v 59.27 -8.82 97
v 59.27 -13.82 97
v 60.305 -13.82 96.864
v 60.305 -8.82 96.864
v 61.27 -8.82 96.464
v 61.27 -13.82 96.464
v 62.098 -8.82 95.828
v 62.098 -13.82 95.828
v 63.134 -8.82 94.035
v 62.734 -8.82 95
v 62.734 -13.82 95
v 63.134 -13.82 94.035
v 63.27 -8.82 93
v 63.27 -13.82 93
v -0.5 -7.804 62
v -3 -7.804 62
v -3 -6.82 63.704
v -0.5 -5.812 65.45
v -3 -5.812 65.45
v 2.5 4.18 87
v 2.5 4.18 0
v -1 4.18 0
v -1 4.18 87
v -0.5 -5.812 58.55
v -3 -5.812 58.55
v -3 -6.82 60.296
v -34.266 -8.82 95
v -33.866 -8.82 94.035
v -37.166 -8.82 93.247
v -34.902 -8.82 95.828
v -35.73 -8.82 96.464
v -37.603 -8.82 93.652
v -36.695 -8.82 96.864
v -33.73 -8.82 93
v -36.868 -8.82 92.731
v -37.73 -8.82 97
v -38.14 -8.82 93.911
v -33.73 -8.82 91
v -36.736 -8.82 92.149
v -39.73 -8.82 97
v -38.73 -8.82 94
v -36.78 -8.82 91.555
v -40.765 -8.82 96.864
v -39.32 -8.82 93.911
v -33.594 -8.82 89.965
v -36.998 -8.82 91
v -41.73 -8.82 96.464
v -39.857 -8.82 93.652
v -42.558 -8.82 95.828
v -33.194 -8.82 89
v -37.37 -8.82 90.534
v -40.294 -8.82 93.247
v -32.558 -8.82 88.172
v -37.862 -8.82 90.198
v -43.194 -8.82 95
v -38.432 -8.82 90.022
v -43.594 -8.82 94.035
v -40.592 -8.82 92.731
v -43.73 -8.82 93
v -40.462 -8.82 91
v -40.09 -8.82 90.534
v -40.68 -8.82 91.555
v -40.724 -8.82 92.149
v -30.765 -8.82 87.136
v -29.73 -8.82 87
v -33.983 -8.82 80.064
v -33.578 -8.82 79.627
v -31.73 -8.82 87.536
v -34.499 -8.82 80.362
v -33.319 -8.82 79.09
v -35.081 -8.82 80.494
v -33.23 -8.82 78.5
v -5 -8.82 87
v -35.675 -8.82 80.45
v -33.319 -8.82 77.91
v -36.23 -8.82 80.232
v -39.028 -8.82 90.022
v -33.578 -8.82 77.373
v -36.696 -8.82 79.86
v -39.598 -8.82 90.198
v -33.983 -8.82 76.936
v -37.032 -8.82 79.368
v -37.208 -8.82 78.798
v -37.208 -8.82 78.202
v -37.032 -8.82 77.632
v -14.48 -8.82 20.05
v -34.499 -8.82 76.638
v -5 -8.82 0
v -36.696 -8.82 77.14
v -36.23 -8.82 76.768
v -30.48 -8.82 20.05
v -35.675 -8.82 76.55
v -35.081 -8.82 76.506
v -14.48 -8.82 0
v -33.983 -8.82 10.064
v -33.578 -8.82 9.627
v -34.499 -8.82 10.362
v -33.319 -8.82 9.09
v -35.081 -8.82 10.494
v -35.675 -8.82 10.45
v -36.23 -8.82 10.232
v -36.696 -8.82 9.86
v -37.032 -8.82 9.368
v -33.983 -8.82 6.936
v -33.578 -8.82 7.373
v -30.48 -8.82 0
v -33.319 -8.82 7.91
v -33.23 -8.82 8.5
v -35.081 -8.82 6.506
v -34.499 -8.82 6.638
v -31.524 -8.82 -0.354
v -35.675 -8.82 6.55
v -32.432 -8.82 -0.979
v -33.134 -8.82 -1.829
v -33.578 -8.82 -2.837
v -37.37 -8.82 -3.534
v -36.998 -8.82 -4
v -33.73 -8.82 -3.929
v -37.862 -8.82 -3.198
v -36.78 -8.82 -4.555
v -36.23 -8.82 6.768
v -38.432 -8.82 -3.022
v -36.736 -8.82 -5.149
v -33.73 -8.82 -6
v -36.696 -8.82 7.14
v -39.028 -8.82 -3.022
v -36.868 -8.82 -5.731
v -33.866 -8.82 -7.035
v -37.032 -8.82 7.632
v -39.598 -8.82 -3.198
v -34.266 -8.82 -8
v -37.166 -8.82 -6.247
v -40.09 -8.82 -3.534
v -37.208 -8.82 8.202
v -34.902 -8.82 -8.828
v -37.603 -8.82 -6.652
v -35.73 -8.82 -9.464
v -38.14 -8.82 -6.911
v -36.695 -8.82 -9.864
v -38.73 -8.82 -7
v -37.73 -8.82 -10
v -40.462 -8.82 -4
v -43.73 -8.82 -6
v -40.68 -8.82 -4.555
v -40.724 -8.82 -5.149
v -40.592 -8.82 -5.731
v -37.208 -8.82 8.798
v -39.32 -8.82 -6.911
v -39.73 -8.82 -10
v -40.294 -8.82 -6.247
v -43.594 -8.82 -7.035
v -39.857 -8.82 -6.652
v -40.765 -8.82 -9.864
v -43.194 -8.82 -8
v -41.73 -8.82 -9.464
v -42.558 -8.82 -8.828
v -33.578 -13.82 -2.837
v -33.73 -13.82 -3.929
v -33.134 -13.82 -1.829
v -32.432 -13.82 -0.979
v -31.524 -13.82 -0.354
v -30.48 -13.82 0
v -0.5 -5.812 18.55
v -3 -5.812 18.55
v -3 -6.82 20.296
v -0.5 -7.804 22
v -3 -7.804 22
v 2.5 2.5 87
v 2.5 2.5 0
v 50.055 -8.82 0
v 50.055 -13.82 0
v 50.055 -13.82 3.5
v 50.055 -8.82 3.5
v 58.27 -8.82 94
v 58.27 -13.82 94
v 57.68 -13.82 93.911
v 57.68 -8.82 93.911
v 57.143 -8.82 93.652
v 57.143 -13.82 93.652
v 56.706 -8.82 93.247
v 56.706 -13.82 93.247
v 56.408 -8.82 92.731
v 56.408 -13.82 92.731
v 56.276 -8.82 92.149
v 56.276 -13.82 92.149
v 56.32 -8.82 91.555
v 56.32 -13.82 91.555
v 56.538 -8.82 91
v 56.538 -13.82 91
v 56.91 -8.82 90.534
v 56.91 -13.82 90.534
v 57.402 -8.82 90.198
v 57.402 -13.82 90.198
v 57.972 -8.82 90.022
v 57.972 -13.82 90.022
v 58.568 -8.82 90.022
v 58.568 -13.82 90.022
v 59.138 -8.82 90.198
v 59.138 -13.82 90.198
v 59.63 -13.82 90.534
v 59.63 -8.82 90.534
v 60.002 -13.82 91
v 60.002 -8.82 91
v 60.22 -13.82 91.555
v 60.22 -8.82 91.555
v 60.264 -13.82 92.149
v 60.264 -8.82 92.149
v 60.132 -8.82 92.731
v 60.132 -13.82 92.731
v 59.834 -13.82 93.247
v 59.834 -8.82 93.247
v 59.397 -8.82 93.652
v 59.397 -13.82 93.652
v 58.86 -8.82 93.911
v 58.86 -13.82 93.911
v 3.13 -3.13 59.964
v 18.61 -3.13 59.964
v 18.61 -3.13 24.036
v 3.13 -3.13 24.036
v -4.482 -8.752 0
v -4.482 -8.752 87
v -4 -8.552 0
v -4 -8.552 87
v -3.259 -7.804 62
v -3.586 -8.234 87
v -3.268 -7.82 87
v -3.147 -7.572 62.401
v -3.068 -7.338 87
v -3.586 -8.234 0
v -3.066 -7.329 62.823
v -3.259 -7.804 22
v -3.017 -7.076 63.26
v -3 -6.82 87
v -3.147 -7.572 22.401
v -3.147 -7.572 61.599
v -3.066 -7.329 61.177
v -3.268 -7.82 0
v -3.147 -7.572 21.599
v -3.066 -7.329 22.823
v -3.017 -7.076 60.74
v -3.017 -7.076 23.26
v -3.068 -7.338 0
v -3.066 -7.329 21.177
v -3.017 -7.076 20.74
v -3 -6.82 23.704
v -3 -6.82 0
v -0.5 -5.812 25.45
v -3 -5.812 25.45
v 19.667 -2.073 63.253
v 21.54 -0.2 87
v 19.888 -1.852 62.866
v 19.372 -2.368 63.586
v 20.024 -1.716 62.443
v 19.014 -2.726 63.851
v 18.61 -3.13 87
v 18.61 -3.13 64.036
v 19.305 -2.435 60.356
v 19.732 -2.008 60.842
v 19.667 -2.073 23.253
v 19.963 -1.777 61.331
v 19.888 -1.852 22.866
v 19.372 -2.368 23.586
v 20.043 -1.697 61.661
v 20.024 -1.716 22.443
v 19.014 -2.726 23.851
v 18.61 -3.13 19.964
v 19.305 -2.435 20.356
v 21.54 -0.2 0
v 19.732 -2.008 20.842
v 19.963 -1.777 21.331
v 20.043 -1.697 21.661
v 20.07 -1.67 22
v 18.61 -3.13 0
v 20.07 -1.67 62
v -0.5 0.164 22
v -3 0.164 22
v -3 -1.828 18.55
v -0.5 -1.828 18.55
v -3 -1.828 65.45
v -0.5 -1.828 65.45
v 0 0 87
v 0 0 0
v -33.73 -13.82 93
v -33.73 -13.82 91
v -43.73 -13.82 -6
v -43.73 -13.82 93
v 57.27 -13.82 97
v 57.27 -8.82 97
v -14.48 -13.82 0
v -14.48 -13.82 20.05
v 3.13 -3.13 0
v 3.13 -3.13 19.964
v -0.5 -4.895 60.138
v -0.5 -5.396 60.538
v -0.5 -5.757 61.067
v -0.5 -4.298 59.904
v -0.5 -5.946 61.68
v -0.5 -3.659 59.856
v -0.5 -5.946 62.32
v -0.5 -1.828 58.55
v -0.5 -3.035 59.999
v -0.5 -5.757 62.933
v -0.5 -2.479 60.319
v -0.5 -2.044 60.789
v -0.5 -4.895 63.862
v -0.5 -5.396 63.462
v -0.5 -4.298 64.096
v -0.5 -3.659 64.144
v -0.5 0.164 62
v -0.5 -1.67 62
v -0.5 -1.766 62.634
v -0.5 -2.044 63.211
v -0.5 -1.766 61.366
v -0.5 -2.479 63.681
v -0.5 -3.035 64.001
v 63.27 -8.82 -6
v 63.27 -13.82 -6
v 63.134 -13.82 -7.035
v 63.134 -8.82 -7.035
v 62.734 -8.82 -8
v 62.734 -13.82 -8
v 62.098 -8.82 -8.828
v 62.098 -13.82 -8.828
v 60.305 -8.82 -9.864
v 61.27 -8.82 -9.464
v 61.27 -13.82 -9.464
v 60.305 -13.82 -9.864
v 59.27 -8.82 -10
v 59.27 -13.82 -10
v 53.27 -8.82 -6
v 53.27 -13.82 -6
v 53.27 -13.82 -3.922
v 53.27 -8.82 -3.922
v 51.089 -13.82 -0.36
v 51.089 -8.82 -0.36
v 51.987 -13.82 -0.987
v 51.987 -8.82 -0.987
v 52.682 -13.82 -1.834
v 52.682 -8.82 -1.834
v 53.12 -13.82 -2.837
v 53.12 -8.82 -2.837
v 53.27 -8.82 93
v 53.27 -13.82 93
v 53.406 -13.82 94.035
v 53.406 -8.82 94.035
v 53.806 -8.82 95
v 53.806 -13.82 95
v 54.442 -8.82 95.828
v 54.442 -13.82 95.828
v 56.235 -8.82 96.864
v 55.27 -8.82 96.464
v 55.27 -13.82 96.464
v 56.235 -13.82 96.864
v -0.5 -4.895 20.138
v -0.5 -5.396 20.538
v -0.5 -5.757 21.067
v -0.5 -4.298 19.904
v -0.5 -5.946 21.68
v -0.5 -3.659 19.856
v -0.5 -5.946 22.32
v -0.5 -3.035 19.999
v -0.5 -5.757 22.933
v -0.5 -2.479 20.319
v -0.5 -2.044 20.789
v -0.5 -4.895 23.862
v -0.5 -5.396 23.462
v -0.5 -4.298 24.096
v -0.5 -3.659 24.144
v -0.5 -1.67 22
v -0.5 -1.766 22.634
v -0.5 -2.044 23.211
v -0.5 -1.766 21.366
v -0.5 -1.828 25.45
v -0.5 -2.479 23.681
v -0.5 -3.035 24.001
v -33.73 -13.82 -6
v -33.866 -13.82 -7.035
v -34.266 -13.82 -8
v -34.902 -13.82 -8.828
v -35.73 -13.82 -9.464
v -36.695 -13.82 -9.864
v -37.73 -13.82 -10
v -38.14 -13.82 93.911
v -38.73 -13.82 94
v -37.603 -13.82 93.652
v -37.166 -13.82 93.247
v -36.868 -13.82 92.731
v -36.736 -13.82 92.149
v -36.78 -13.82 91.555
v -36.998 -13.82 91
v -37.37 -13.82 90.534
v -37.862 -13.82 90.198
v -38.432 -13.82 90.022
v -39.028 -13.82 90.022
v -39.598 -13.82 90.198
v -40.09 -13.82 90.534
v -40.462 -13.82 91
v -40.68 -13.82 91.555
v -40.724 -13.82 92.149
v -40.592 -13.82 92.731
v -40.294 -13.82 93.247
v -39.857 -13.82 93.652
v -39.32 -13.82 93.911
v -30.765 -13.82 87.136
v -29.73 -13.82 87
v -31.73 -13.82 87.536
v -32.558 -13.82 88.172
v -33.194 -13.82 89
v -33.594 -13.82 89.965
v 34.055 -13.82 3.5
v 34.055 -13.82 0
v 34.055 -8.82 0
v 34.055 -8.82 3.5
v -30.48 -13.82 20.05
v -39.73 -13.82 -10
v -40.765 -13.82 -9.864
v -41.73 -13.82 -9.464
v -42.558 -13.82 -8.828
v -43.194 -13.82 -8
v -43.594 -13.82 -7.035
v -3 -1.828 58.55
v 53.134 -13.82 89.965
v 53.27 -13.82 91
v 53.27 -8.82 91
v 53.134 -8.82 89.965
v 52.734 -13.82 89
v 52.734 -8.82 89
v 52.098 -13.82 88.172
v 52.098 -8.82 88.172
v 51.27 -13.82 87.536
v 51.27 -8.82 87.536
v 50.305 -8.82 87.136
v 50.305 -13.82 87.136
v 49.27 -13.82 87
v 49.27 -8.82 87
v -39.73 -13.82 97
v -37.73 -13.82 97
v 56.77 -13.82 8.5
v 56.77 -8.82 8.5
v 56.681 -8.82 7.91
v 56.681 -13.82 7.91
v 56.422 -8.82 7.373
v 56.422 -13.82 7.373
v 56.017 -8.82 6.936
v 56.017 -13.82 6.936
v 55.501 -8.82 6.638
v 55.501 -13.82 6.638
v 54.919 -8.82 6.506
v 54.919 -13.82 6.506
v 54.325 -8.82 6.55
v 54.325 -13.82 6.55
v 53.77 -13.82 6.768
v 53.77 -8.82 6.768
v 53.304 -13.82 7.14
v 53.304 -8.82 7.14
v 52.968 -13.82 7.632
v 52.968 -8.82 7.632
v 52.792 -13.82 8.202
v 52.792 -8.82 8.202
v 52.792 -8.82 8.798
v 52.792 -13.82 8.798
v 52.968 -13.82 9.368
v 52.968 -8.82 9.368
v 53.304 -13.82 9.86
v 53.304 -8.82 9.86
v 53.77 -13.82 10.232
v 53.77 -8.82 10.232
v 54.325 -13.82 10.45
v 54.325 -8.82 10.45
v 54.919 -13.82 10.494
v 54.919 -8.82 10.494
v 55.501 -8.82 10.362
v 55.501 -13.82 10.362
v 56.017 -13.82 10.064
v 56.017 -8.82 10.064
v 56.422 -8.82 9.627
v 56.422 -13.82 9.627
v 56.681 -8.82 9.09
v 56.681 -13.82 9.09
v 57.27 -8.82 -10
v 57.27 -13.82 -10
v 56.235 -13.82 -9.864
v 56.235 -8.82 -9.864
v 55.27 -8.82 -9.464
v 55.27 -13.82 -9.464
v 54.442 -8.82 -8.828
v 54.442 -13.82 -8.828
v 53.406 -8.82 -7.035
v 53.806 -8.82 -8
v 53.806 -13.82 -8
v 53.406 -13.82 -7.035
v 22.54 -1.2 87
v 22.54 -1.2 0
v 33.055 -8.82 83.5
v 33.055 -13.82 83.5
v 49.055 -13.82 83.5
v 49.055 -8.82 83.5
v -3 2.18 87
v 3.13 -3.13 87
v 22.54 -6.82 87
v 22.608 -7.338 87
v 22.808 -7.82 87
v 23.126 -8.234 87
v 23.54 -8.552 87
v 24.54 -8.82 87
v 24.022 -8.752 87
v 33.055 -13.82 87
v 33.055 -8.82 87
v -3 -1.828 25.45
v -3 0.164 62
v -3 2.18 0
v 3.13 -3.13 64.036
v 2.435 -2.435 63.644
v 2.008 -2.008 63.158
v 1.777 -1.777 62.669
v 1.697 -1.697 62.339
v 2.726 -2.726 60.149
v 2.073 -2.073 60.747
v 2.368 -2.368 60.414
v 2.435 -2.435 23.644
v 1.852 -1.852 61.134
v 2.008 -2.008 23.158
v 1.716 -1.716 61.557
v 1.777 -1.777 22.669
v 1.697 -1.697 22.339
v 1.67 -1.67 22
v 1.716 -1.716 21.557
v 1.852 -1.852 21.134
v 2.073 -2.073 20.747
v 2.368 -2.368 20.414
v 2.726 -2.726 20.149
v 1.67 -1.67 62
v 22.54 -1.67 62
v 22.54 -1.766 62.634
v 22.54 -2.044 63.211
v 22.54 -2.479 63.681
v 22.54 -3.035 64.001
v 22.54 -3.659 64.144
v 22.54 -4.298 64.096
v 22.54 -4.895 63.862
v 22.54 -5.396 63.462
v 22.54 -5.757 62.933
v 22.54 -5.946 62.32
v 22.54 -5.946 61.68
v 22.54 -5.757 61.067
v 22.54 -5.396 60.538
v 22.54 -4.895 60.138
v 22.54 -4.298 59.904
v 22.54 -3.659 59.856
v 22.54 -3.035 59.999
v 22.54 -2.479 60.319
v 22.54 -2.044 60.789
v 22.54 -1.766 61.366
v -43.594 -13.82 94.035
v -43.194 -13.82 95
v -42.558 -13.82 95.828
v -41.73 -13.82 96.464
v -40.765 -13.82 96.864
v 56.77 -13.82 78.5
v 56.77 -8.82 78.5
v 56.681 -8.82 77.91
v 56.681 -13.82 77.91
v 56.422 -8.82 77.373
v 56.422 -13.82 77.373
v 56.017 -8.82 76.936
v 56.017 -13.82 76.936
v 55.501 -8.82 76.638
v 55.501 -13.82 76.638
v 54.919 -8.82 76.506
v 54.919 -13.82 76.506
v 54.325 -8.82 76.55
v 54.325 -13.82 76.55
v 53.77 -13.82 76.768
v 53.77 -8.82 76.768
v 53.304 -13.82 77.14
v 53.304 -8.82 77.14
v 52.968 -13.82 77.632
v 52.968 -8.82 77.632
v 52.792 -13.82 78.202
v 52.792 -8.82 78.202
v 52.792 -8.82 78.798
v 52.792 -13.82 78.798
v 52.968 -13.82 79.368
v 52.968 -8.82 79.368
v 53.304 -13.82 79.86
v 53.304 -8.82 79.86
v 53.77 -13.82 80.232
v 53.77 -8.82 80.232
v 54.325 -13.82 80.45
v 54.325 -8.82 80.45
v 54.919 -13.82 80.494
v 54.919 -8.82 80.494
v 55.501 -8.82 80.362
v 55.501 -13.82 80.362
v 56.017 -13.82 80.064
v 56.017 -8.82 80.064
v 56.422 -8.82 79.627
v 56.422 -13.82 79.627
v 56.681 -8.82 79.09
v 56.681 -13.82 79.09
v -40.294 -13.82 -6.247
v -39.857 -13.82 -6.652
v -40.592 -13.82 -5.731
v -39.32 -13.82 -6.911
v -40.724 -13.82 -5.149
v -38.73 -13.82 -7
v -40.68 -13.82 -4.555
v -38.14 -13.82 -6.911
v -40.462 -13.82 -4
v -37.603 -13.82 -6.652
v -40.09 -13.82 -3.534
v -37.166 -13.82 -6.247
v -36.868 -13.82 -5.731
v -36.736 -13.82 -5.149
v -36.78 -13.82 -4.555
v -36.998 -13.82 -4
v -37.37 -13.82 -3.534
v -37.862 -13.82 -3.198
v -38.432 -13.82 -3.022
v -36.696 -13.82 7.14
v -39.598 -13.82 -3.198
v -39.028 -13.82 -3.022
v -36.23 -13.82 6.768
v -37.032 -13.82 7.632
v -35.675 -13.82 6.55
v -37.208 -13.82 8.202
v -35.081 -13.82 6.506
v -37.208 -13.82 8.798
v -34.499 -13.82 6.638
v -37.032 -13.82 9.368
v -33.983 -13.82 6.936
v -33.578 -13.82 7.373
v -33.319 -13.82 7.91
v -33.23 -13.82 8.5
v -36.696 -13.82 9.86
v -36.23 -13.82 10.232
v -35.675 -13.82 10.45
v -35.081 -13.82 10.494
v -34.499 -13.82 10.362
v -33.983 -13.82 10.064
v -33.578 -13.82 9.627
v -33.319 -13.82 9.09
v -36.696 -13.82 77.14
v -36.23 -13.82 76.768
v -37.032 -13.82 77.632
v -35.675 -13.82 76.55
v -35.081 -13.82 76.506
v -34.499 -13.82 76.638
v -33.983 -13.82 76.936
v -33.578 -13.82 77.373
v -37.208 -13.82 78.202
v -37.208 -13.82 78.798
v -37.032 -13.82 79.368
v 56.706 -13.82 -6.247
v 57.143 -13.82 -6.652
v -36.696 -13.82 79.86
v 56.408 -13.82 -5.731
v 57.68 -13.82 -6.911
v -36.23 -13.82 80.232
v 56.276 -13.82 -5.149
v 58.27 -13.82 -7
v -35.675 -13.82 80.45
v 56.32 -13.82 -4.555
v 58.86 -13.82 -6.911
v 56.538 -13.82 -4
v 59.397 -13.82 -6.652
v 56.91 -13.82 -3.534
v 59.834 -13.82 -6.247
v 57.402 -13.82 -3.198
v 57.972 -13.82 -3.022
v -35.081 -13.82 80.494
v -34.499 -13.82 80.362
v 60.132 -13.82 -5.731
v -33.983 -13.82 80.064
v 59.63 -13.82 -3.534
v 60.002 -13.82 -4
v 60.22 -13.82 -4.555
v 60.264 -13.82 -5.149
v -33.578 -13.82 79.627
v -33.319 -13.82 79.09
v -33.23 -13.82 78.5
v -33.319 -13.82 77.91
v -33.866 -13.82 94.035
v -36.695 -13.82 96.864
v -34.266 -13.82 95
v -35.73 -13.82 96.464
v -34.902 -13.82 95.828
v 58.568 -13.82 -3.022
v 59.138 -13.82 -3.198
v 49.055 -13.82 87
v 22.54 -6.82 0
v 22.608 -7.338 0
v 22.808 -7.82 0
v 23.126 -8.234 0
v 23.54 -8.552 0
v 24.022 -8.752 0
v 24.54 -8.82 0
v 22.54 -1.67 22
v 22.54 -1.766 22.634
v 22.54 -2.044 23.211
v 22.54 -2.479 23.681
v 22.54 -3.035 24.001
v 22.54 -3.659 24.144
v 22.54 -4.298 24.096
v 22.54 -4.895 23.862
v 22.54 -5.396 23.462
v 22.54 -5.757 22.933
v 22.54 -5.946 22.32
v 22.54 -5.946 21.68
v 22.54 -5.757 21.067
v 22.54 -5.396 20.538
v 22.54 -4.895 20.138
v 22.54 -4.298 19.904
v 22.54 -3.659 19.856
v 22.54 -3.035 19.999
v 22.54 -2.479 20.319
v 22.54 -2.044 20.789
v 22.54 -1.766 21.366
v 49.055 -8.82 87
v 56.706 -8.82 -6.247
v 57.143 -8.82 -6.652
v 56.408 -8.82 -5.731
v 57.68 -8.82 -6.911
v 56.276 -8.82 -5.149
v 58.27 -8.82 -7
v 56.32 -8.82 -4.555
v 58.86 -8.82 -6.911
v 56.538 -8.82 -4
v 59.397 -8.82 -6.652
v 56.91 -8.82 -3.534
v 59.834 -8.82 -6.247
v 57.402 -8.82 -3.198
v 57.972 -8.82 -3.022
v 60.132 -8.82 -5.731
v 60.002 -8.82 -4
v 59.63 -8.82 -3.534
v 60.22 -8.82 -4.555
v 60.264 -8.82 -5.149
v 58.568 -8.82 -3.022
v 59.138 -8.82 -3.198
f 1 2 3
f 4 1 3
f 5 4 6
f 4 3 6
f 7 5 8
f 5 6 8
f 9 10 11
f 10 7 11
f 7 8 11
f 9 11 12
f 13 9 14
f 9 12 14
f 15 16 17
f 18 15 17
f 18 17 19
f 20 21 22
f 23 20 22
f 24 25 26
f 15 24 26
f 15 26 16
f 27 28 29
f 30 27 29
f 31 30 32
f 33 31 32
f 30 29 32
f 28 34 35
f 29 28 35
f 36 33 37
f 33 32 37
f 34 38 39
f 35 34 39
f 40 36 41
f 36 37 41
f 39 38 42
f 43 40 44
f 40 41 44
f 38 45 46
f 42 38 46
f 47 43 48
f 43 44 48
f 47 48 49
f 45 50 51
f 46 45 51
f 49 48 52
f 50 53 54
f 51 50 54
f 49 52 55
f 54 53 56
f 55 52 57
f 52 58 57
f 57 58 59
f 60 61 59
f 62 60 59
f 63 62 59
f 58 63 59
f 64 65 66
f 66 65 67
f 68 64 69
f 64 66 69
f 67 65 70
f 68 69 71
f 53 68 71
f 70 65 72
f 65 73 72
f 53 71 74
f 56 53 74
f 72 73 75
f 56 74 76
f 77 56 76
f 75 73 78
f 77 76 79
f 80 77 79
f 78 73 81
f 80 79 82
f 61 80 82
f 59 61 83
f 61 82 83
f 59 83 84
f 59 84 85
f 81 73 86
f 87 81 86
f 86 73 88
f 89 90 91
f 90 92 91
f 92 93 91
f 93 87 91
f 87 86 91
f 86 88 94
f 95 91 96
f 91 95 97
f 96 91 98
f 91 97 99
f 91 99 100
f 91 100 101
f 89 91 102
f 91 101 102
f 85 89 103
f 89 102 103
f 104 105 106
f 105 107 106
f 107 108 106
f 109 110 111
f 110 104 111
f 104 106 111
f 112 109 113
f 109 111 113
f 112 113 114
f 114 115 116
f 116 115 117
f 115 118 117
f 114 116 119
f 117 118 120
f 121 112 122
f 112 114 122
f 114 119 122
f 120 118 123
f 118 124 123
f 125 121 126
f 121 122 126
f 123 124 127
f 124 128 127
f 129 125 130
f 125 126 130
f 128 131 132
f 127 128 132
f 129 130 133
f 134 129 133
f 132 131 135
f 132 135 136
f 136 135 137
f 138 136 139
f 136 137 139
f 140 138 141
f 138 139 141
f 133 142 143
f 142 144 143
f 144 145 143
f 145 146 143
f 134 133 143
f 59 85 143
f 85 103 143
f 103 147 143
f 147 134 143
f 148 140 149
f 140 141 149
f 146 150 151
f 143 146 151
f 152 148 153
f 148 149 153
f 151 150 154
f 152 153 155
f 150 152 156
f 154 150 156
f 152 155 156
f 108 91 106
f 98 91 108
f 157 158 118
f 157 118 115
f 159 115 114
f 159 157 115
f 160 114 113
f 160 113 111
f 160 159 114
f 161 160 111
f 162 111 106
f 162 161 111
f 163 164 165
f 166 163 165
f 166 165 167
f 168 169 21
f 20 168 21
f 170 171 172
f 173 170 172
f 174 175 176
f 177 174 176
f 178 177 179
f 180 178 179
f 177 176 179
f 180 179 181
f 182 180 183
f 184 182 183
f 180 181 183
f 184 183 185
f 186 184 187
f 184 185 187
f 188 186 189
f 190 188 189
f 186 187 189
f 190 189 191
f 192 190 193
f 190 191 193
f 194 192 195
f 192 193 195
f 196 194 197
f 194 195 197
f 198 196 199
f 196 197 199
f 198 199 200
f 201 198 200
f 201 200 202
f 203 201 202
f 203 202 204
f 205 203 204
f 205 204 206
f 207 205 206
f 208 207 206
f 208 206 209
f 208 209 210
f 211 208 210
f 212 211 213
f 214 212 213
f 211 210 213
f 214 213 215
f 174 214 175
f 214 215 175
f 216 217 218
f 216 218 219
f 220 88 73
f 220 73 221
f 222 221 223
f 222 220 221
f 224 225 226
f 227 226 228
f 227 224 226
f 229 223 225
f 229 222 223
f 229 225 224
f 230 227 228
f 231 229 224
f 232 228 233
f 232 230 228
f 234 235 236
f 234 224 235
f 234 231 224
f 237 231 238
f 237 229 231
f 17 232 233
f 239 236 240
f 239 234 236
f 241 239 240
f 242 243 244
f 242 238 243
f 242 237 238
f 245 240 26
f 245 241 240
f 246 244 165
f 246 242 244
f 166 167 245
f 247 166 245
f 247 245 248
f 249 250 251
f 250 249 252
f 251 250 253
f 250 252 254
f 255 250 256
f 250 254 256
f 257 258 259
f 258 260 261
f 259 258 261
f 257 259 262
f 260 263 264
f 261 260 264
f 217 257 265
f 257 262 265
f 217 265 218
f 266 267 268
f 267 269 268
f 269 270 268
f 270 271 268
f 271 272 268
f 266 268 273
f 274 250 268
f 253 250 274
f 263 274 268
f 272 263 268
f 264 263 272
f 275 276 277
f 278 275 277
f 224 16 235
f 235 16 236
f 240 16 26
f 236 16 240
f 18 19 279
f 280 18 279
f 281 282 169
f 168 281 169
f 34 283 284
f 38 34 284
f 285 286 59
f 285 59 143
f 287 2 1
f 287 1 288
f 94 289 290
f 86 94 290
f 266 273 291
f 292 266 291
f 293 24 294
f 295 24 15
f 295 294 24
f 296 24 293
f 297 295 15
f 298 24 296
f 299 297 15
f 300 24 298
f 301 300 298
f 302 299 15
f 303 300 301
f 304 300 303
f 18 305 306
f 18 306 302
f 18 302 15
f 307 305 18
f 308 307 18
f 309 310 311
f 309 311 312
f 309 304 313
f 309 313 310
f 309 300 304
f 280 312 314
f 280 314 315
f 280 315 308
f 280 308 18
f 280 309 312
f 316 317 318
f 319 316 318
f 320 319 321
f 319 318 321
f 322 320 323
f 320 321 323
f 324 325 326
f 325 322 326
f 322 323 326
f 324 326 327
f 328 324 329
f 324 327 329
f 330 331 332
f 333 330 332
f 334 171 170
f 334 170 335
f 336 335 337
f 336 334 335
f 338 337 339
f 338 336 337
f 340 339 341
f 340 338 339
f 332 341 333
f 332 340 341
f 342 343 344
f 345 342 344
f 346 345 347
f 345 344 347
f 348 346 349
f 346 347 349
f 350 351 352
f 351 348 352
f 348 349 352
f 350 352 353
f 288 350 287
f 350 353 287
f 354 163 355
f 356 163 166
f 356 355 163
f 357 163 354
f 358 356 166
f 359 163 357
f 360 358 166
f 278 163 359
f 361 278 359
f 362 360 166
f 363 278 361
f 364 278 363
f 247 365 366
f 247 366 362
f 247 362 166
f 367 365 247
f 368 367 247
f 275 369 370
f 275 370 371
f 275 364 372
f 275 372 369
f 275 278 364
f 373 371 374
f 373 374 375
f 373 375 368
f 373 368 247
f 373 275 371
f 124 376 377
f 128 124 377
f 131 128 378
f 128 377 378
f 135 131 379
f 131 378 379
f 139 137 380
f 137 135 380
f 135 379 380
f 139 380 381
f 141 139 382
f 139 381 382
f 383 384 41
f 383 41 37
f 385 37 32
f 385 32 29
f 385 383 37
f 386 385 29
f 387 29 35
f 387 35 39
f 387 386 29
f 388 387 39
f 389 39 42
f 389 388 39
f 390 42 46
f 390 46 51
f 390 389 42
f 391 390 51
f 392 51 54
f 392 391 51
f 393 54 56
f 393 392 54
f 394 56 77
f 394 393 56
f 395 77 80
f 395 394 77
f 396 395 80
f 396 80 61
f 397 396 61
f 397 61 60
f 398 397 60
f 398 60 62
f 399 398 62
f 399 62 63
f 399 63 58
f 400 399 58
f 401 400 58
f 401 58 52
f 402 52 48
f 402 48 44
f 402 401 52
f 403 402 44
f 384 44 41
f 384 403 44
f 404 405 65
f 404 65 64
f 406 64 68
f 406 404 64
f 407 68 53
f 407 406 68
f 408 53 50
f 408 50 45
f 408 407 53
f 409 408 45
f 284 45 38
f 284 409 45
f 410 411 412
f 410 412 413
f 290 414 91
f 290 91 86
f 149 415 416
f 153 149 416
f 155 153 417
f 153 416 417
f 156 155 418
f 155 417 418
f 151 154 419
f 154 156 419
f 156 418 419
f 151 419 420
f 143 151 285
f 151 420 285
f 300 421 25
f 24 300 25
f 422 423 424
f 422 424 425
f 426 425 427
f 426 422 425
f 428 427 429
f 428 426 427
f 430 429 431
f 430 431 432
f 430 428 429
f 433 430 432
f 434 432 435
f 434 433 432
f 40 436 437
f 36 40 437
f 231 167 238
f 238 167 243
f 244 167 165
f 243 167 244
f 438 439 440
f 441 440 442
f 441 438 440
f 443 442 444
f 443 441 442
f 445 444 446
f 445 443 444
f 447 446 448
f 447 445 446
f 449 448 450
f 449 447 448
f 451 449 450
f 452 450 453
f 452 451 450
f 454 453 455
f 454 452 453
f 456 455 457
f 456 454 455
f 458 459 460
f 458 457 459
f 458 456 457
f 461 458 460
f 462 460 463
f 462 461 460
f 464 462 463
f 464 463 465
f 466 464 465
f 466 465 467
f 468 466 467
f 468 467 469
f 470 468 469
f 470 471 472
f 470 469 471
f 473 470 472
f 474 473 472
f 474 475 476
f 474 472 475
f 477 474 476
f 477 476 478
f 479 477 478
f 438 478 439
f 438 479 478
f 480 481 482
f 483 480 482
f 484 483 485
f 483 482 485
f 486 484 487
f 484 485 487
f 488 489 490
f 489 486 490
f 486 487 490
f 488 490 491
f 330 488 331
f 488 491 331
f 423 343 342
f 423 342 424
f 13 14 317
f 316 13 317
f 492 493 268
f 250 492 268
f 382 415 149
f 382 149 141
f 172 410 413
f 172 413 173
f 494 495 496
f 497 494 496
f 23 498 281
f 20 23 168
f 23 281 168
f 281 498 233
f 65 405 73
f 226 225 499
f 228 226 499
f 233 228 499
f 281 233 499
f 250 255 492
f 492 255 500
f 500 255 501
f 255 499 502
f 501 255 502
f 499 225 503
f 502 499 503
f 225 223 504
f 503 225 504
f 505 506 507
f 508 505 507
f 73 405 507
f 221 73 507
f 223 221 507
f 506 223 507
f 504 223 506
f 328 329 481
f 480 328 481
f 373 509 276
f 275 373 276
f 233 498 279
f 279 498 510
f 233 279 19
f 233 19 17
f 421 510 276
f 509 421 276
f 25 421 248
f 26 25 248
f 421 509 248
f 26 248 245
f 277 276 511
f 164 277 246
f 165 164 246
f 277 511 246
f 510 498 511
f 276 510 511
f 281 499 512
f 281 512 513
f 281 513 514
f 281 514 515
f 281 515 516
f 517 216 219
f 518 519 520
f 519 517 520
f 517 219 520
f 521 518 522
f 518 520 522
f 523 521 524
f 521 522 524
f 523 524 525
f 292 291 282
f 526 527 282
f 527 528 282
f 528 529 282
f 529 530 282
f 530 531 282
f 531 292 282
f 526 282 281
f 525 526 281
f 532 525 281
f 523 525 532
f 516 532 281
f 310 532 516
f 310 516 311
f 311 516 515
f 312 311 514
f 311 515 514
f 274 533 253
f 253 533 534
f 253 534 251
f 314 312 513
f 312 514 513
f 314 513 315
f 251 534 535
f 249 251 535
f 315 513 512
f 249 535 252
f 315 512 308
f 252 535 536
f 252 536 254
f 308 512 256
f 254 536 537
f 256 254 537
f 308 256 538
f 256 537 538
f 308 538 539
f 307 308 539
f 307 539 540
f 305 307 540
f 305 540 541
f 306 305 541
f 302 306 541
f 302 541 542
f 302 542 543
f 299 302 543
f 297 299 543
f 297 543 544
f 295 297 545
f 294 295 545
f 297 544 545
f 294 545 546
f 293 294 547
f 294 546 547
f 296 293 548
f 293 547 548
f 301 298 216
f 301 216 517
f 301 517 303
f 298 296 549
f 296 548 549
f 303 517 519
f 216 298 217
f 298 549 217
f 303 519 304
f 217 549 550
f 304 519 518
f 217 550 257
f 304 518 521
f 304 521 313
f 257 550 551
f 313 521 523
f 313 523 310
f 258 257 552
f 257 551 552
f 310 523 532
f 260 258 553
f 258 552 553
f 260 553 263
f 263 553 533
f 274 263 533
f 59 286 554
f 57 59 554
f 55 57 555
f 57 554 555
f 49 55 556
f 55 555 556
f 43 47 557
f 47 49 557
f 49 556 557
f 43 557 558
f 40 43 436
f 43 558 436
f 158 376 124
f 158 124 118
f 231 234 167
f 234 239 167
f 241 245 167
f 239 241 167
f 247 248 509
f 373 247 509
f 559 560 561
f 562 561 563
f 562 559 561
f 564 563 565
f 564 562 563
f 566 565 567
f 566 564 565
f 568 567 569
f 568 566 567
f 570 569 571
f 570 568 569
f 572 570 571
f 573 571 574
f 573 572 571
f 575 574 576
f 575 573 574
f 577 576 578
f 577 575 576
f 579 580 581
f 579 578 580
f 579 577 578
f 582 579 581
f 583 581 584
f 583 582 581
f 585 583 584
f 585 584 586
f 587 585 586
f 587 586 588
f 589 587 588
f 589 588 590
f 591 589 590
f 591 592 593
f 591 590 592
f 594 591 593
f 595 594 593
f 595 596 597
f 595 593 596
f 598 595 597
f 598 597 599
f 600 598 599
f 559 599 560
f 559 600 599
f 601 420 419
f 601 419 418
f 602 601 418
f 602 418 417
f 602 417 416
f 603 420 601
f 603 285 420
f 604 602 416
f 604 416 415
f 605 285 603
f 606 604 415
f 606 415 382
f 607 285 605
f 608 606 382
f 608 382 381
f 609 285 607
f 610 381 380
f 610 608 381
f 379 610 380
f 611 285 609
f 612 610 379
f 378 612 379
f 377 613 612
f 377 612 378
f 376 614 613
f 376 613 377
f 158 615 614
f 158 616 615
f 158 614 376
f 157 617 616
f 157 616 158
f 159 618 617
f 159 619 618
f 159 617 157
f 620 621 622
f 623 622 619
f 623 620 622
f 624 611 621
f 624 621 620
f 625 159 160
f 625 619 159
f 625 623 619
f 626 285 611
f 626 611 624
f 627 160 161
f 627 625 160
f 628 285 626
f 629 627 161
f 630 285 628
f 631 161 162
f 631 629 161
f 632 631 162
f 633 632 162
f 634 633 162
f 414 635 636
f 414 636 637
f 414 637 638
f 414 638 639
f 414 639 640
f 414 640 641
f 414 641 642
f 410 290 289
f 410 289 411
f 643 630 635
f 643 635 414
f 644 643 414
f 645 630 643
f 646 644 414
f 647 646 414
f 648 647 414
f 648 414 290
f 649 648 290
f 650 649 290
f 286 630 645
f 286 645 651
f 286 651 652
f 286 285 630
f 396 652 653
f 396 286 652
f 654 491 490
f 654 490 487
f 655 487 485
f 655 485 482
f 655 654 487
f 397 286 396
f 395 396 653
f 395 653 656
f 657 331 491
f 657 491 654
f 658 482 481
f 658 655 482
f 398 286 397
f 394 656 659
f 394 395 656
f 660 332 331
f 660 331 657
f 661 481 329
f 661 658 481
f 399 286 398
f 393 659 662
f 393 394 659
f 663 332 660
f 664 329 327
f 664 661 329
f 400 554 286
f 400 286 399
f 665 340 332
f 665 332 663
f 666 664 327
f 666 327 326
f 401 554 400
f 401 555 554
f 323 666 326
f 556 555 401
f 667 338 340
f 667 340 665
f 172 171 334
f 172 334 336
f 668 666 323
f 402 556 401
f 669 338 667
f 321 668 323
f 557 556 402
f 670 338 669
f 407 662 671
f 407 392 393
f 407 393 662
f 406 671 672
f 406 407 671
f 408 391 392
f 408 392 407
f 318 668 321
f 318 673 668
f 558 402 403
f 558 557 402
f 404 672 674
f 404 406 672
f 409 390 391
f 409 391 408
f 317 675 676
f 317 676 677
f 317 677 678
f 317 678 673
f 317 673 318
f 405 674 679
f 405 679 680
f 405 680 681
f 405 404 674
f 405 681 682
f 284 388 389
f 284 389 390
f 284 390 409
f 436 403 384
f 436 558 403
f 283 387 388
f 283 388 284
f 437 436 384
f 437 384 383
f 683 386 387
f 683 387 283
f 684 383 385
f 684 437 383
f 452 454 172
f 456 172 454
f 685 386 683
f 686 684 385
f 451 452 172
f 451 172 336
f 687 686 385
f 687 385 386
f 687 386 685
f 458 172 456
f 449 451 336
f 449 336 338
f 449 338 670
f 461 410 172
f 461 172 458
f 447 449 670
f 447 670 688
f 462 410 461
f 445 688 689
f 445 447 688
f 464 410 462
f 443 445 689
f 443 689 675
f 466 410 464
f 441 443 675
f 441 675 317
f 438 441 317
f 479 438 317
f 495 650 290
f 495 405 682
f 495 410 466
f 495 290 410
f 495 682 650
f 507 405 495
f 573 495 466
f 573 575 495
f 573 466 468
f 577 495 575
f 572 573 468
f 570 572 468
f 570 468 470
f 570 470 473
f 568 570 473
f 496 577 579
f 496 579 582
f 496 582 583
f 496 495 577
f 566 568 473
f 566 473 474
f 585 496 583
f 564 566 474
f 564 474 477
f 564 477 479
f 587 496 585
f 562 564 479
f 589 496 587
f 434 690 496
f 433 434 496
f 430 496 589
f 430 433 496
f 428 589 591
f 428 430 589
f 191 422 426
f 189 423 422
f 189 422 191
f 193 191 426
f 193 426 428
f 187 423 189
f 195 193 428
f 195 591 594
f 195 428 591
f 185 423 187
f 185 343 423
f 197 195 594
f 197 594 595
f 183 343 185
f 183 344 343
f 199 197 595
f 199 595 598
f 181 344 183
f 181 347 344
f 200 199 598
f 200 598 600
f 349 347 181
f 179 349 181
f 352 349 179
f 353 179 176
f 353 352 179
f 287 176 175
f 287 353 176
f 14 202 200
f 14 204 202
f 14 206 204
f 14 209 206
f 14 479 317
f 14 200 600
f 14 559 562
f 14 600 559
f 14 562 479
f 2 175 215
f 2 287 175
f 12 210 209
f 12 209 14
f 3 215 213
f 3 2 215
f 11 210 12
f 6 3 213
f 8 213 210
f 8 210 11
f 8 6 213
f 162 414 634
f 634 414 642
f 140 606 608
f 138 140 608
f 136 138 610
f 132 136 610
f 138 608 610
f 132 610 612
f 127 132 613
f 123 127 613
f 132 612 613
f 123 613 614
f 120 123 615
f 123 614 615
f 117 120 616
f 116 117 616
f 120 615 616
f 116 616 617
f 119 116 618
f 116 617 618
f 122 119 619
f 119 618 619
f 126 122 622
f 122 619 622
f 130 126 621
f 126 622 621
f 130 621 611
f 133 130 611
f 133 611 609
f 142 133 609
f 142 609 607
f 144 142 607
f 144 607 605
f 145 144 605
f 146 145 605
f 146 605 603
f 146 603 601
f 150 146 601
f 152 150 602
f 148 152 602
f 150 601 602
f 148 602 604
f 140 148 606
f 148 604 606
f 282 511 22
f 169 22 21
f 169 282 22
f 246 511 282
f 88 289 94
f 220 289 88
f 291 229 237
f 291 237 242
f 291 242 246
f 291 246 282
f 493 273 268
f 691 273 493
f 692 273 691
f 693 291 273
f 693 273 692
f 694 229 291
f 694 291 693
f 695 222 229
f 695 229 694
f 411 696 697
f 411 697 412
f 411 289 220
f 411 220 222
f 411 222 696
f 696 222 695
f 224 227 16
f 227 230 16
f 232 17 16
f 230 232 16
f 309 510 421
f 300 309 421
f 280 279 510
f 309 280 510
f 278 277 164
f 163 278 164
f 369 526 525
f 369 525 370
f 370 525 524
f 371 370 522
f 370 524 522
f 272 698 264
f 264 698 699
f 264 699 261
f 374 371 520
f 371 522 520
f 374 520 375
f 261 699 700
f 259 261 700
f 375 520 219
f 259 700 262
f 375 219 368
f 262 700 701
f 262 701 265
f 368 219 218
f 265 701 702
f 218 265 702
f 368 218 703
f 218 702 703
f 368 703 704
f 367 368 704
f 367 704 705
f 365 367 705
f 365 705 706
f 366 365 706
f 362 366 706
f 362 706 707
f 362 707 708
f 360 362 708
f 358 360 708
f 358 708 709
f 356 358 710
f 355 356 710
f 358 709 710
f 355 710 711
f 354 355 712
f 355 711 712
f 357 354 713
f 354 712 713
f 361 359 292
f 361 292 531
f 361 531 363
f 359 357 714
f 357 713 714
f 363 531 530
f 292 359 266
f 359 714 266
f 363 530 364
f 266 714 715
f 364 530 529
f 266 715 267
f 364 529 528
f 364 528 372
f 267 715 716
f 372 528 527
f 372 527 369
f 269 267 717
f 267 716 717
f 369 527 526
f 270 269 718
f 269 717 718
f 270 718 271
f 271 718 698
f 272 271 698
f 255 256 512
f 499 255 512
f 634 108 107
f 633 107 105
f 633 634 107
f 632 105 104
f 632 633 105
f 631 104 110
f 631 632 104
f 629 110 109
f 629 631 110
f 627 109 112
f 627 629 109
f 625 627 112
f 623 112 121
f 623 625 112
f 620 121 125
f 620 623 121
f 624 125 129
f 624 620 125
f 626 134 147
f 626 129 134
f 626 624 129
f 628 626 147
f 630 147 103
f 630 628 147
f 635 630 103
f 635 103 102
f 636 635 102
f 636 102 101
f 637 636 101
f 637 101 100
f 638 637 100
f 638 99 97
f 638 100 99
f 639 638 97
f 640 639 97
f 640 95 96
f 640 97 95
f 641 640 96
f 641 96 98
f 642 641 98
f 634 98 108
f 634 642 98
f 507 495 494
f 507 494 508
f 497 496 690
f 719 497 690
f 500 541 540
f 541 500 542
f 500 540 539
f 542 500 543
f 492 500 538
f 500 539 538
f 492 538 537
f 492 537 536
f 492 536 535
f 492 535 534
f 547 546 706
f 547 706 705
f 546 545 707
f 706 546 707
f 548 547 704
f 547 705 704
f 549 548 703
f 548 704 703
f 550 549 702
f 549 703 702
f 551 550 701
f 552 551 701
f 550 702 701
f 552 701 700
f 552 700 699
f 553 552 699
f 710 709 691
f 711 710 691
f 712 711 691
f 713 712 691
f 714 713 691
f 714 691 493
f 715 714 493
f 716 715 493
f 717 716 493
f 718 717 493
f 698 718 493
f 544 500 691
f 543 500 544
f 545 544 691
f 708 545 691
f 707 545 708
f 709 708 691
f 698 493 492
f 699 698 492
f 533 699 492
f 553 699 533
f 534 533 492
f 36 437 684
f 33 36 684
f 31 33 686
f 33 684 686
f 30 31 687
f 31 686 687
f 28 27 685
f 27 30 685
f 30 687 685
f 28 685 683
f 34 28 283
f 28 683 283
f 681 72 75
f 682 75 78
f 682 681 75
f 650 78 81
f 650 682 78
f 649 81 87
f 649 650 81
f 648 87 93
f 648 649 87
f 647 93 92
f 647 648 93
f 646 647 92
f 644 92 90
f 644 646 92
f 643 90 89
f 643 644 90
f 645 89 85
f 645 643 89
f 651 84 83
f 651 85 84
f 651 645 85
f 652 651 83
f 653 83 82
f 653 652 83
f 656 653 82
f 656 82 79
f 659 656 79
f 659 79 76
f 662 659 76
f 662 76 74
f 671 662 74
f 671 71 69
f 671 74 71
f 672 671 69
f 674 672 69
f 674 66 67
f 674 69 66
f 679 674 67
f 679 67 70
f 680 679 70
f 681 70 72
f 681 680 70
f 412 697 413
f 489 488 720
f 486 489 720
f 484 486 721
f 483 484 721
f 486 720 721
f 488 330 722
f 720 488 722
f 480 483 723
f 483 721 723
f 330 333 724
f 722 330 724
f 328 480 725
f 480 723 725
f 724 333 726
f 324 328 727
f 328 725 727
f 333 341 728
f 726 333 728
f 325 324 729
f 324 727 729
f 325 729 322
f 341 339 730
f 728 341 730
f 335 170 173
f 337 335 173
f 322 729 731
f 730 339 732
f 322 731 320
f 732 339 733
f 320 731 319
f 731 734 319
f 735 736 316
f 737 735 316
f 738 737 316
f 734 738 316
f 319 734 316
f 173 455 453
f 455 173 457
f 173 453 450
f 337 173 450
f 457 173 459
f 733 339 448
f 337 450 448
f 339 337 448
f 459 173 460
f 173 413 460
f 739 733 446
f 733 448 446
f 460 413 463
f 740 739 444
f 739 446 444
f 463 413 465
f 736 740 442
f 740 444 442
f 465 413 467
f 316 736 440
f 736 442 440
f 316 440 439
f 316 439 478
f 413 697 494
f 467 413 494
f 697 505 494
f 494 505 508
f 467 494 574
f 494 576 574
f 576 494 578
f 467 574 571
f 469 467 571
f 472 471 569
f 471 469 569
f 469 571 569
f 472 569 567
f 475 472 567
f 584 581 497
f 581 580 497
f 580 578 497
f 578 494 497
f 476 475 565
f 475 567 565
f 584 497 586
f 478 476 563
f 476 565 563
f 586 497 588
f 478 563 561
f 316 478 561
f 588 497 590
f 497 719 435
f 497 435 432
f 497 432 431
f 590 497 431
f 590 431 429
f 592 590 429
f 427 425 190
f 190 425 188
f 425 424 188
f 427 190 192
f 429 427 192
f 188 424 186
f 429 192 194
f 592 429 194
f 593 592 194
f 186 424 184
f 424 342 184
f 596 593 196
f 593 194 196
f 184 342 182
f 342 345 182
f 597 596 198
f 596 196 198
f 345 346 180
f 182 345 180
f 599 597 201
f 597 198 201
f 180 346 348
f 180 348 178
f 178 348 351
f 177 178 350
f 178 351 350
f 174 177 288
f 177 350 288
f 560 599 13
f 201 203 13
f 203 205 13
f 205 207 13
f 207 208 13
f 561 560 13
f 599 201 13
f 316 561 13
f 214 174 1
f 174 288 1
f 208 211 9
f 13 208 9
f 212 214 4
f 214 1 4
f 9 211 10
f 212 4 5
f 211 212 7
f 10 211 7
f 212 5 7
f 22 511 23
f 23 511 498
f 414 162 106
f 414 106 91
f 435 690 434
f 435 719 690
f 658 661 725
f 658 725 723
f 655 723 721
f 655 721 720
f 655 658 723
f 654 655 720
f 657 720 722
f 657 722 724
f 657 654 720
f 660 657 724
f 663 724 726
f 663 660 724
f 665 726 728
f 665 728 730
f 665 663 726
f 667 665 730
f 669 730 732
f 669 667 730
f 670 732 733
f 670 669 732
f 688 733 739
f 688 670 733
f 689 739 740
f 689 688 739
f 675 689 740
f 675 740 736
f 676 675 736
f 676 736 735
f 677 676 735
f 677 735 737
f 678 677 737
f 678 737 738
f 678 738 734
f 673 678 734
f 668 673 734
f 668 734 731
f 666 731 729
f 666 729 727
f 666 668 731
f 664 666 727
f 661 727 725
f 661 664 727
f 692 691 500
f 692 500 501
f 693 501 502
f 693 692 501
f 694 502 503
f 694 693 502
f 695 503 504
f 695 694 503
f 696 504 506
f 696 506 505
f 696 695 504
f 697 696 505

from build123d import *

# Parameters (mm, degrees)
BOSS_EXTRUDE1_DEPTH             = 87
CUT_EXTRUDE2_REACH              = 112.235
SKETCH7_R                       = 2.15
CUT_EXTRUDE3_DEPTH              = 2.5
F_4_0_START                     = -13.82
F_4_0_MM_DOWEL_HOLES1_OUTLINE_R = 2
F_4_0_MM_DOWEL_HOLES1_DEPTH     = 5.82
SKETCH11_W                      = 16
SKETCH11_H                      = 20.05000263
SKETCH11_H_2                    = 3.5
CUT_EXTRUDE4_DEPTH              = 10
SKETCH12_W                      = 10
SKETCH12_H                      = 10
SKETCH12_R                      = 2
BOSS_EXTRUDE2_DEPTH             = 5
MIRROR2_COPY_1_SKETCH_W         = 10
MIRROR2_COPY_1_SKETCH_H         = 10
MIRROR2_COPY_1_SKETCH_R         = 2
MIRROR2_COPY_1_DEPTH            = 5
FILLET1_R                       = 4
FILLET2_R                       = 2
CHAMFER1_SIZE                   = 2


with BuildPart() as part:
    # Sketch1 → Boss-Extrude1 (new body)
    with BuildSketch(Plane.XY):
        Polygon((0, 0), (2.5, 2.5), (2.5, 4.18), (-3, 4.18), (-3, -8.82), (-43.73, -8.82), (-43.73, -13.82), (63.27, -13.82), (63.27, -8.82), (22.54, -8.82), (22.54, -1.2), (21.54, -0.2), (18.61, -3.13), (3.13, -3.13), align=None)
    extrude(amount=BOSS_EXTRUDE1_DEPTH)

    # Sketch7 → Cut-Extrude2 (cut, up to next)
    with BuildSketch(Plane(origin=(22.54, 0, 0), x_dir=(0, 0, -1), z_dir=(1, 0, 0)), mode=Mode.PRIVATE) as cut_extrude2_sk1:
        with Locations(Location((-62, -3.82, 0), (0, 0, 90))):
            Circle(SKETCH7_R)
    cut_extrude2_tool1 = extrude(cut_extrude2_sk1.sketch, amount=-CUT_EXTRUDE2_REACH, mode=Mode.PRIVATE) & part.part
    # Sketch7 → Cut-Extrude2 (cut, up to next)
    with BuildSketch(Plane(origin=(22.54, 0, 0), x_dir=(0, 0, -1), z_dir=(1, 0, 0)), mode=Mode.PRIVATE) as cut_extrude2_sk2:
        with Locations(Location((-22, -3.82, 0), (0, 0, 90))):
            Circle(SKETCH7_R)
    cut_extrude2_tool2 = extrude(cut_extrude2_sk2.sketch, amount=-CUT_EXTRUDE2_REACH, mode=Mode.PRIVATE) & part.part
    add(cut_extrude2_tool1.solids().sort_by_distance((22.54, -3.82, 62))[0], mode=Mode.SUBTRACT)
    add(cut_extrude2_tool2.solids().sort_by_distance((22.54, -3.82, 22))[0], mode=Mode.SUBTRACT)

    # Sketch8 → Cut-Extrude3 (cut)
    with BuildSketch(Plane.ZY.offset(3)):
        Polygon((25.45, -5.811858429), (25.45, -1.828141571), (22, 0.163716857), (18.55, -1.828141571), (18.55, -5.811858429), (22, -7.803716857), align=None)
        Polygon((65.45, -5.811858429), (65.45, -1.828141571), (62, 0.163716857), (58.55, -1.828141571), (58.55, -5.811858429), (62, -7.803716857), align=None)
    extrude(amount=-CUT_EXTRUDE3_DEPTH, mode=Mode.SUBTRACT)

    # Ø4.0 mm Dowel Holes1: read off the stored shape, not the designer's step
    # Ø4.0 mm Dowel Holes1 outline → Ø4.0 mm Dowel Holes1 (cut)
    with BuildSketch(Plane(origin=(0, 0, 0), x_dir=(1, 0, 0), z_dir=(0, 1, 0)).offset(F_4_0_START)):
        with Locations((54.77, -78.5)):
            Circle(F_4_0_MM_DOWEL_HOLES1_OUTLINE_R)
        with Locations((-35.23, -8.5)):
            Circle(F_4_0_MM_DOWEL_HOLES1_OUTLINE_R)
        with Locations((54.77, -8.5)):
            Circle(F_4_0_MM_DOWEL_HOLES1_OUTLINE_R)
        with Locations((-35.23, -78.5)):
            Circle(F_4_0_MM_DOWEL_HOLES1_OUTLINE_R)
    extrude(amount=F_4_0_MM_DOWEL_HOLES1_DEPTH, mode=Mode.SUBTRACT)

    # Sketch11 → Cut-Extrude4 (cut)
    with BuildSketch(Plane.XZ.offset(13.82)):
        with Locations((-22.479997093, 10.025001315)):
            Rectangle(SKETCH11_W, SKETCH11_H)
        with Locations((42.054998939, 1.75)):
            Rectangle(SKETCH11_W, SKETCH11_H_2)
        with Locations((41.054998153, 85.25)):
            Rectangle(SKETCH11_W, SKETCH11_H_2)
    extrude(amount=-CUT_EXTRUDE4_DEPTH, mode=Mode.SUBTRACT)

    # Sketch12 → Boss-Extrude2 (add)
    with BuildSketch(Plane.XZ.offset(13.82)):
        with Locations((-38.73, -5)):
            Rectangle(SKETCH12_W, SKETCH12_H)
        with Locations(Location((-38.73, -5, 0), (0, 0, 270))):
            Circle(SKETCH12_R, mode=Mode.SUBTRACT)
    boss_extrude2 = extrude(amount=-BOSS_EXTRUDE2_DEPTH)

    # Mirror1: Boss-Extrude2 across plane
    add(boss_extrude2.mirror(Plane.XY.offset(43.5)))

    # Mirror2: Boss-Extrude2 across plane
    add(boss_extrude2.mirror(Plane.ZY.offset(-9.77)))

    # Mirror2 copy 1 sketch → Mirror2 copy 1 (add)
    with BuildSketch(Plane(origin=(19.54, -13.82, 87), x_dir=(-1, 0, 0), z_dir=(0, -1, 0))):
        with Locations((-38.73, -5)):
            Rectangle(MIRROR2_COPY_1_SKETCH_W, MIRROR2_COPY_1_SKETCH_H)
        with Locations(Location((-38.73, -5, 0), (0, 0, 270))):
            Circle(MIRROR2_COPY_1_SKETCH_R, mode=Mode.SUBTRACT)
    extrude(amount=-MIRROR2_COPY_1_DEPTH)

    # Fillet1
    # the kernel refuses this fillet: 4 mm, written as the material it adds along each edge
    with BuildSketch(Plane(origin=(-33.73, -13.82, 87), x_dir=(1, 0, 0), z_dir=(0, 1, 0)), Plane(origin=(53.27, -13.82, 87), x_dir=(0, 0, 1), z_dir=(0, 1, 0))) as fillet1_piece_1:
        with BuildLine():
            CenterArc((FILLET1_R, -FILLET1_R), FILLET1_R, 90, 90)
            Line((0, -FILLET1_R), (0, 0))
            Line((0, 0), (FILLET1_R, 0))
        make_face()
    extrude(amount=5)
    with BuildSketch(Plane(origin=(-33.73, -13.82, 0), x_dir=(1, 0, 0), z_dir=(0, 1, 0))) as fillet1_piece_2:
        with BuildLine():
            CenterArc((4, 3.929058966), FILLET1_R, 180, 79.193119511)
            Line((0, 3.929058966), (0, 0))
            Line((0, 0), (3.250002907, 0))
        make_face()
    extrude(amount=5)
    with BuildSketch(Plane(origin=(53.27, -13.82, 0), x_dir=(-1.0, -2.775557561562891e-15, -1.2049110107124816e-12), z_dir=(0, 1, 0))) as fillet1_piece_3:
        with BuildLine():
            CenterArc((4, -3.922215785), FILLET1_R, 101.317738871, 78.682261129)
            Line((0, -3.922215785), (0, 0))
            Line((0, 0), (3.215001061, 0))
        make_face()
    extrude(amount=5)
    # the kernel refuses this fillet: 4 mm, written as the material it takes off along each edge
    with BuildSketch(Plane(origin=(-33.73, -23.82, 97), x_dir=(-1, 0, 0), z_dir=(0, 1, 0)), Plane(origin=(-43.73, -23.82, 97), x_dir=(0, 0, -1), z_dir=(0, 1, 0)), Plane(origin=(-43.73, -23.82, -10), x_dir=(1, 0, 0), z_dir=(0, 1, 0)), Plane(origin=(-33.73, -23.82, -10), x_dir=(0, 0, 1), z_dir=(0, 1, 0))) as fillet1_2_piece_1:
        with BuildLine():
            CenterArc((FILLET1_R, -FILLET1_R), FILLET1_R, 90, 90)
            Line((0, -FILLET1_R), (0, 0))
            Line((0, 0), (FILLET1_R, 0))
        make_face()
    extrude(amount=25, mode=Mode.SUBTRACT)
    with BuildSketch(Plane(origin=(53.27, -23.82, -10), x_dir=(0, 0, 1), z_dir=(0, 1, 0)), Plane(origin=(53.27, -23.82, 97), x_dir=(1, 0, 0), z_dir=(0, 1, 0)), Plane(origin=(63.27, -23.82, 97), x_dir=(0, 0, -1), z_dir=(0, 1, 0)), Plane(origin=(63.27, -23.82, -10), x_dir=(-1, 0, 0), z_dir=(0, 1, 0))) as fillet1_2_piece_2:
        with BuildLine():
            CenterArc((FILLET1_R, FILLET1_R), FILLET1_R, 180, 90)
            Line((0, FILLET1_R), (0, 0))
            Line((0, 0), (FILLET1_R, 0))
        make_face()
    extrude(amount=25, mode=Mode.SUBTRACT)

    # Fillet2
    # the kernel refuses this fillet: 2 mm, written as the material it adds along each edge
    with BuildSketch(Plane(origin=(22.54, -8.82, 0), x_dir=(1, 0, 0), z_dir=(0, 0, 1))) as fillet2_piece_1:
        with BuildLine():
            CenterArc((FILLET2_R, FILLET2_R), FILLET2_R, 180, 90)
            Line((0, FILLET2_R), (0, 0))
            Line((0, 0), (FILLET2_R, 0))
        make_face()
    extrude(amount=87)
    with BuildSketch(Plane(origin=(-3, -8.82, 0), x_dir=(-1, 0, 0), z_dir=(0, 0, 1))) as fillet2_piece_2_section:
        with BuildLine():
            CenterArc((FILLET2_R, -FILLET2_R), FILLET2_R, 90, 90)
            Line((0, -FILLET2_R), (0, 0))
            Line((0, 0), (FILLET2_R, 0))
        make_face()
    fillet2_piece_2 = extrude(amount=87, mode=Mode.PRIVATE)
    fillet2_piece_2 = split(fillet2_piece_2, bisect_by=Plane(origin=(-3, -17.584067085, 5.059936491), z_dir=(0, 0.8660254037844386, -0.5000000000000001)), keep=Keep.TOP, mode=Mode.PRIVATE)
    fillet2_piece_2 = split(fillet2_piece_2, bisect_by=Plane(origin=(-3, 1.468491799, 5.940063509), z_dir=(0, -0.8660254037844385, -0.5000000000000003)), keep=Keep.TOP, mode=Mode.PRIVATE)
    add(fillet2_piece_2)
    with BuildSketch(Plane(origin=(-3, -8.82, 0), x_dir=(-1, 0, 0), z_dir=(0, 0, 1))) as fillet2_piece_3_section:
        with BuildLine():
            CenterArc((FILLET2_R, -FILLET2_R), FILLET2_R, 90, 90)
            Line((0, -FILLET2_R), (0, 0))
            Line((0, 0), (FILLET2_R, 0))
        make_face()
    fillet2_piece_3 = extrude(amount=87, mode=Mode.PRIVATE)
    fillet2_piece_3 = split(fillet2_piece_3, bisect_by=Plane(origin=(-3, -17.584067085, 5.059936491), z_dir=(0, -0.8660254037844386, 0.5000000000000001)), keep=Keep.TOP, mode=Mode.PRIVATE)
    fillet2_piece_3 = split(fillet2_piece_3, bisect_by=Plane(origin=(-3, 1.468491799, 5.940063509), z_dir=(0, -0.8660254037844385, -0.5000000000000003)), keep=Keep.TOP, mode=Mode.PRIVATE)
    add(fillet2_piece_3)
    with BuildSketch(Plane(origin=(-3, -8.82, 0), x_dir=(-1, 0, 0), z_dir=(0, 0, 1))) as fillet2_piece_4_section:
        with BuildLine():
            CenterArc((FILLET2_R, -FILLET2_R), FILLET2_R, 90, 90)
            Line((0, -FILLET2_R), (0, 0))
            Line((0, 0), (FILLET2_R, 0))
        make_face()
    fillet2_piece_4 = extrude(amount=87, mode=Mode.PRIVATE)
    fillet2_piece_4 = split(fillet2_piece_4, bisect_by=Plane(origin=(-3, -34.90457516, 15.059936491), z_dir=(0, 0.8660254037844385, -0.5000000000000003)), keep=Keep.TOP, mode=Mode.PRIVATE)
    fillet2_piece_4 = split(fillet2_piece_4, bisect_by=Plane(origin=(-3, 18.788999874, 15.940063509), z_dir=(0, -0.8660254037844385, -0.5000000000000003)), keep=Keep.TOP, mode=Mode.PRIVATE)
    fillet2_piece_4 = split(fillet2_piece_4, bisect_by=Plane(origin=(-3, -17.584067085, 5.059936491), z_dir=(0, -0.8660254037844386, 0.5000000000000001)), keep=Keep.TOP, mode=Mode.PRIVATE)
    fillet2_piece_4 = split(fillet2_piece_4, bisect_by=Plane(origin=(-3, 1.468491799, 5.940063509), z_dir=(0, 0.8660254037844385, 0.5000000000000003)), keep=Keep.TOP, mode=Mode.PRIVATE)
    add(fillet2_piece_4)
    with BuildSketch(Plane(origin=(-3, -8.82, 0), x_dir=(-1, 0, 0), z_dir=(0, 0, 1))) as fillet2_piece_5_section:
        with BuildLine():
            CenterArc((FILLET2_R, -FILLET2_R), FILLET2_R, 90, 90)
            Line((0, -FILLET2_R), (0, 0))
            Line((0, 0), (FILLET2_R, 0))
        make_face()
    fillet2_piece_5 = extrude(amount=87, mode=Mode.PRIVATE)
    fillet2_piece_5 = split(fillet2_piece_5, bisect_by=Plane(origin=(-3, -34.90457516, 15.059936491), z_dir=(0, -0.8660254037844385, 0.5000000000000003)), keep=Keep.TOP, mode=Mode.PRIVATE)
    fillet2_piece_5 = split(fillet2_piece_5, bisect_by=Plane(origin=(-3, 18.788999874, 15.940063509), z_dir=(0, -0.8660254037844385, -0.5000000000000003)), keep=Keep.TOP, mode=Mode.PRIVATE)
    add(fillet2_piece_5)
    with BuildSketch(Plane(origin=(-3, -8.82, 0), x_dir=(-1, 0, 0), z_dir=(0, 0, 1))) as fillet2_piece_6_section:
        with BuildLine():
            CenterArc((FILLET2_R, -FILLET2_R), FILLET2_R, 90, 90)
            Line((0, -FILLET2_R), (0, 0))
            Line((0, 0), (FILLET2_R, 0))
        make_face()
    fillet2_piece_6 = extrude(amount=87, mode=Mode.PRIVATE)
    fillet2_piece_6 = split(fillet2_piece_6, bisect_by=Plane(origin=(-3, -34.90457516, 15.059936491), z_dir=(0, -0.8660254037844385, 0.5000000000000003)), keep=Keep.TOP, mode=Mode.PRIVATE)
    fillet2_piece_6 = split(fillet2_piece_6, bisect_by=Plane(origin=(-3, 18.788999874, 15.940063509), z_dir=(0, 0.8660254037844385, 0.5000000000000003)), keep=Keep.TOP, mode=Mode.PRIVATE)
    add(fillet2_piece_6)

    # Chamfer1
    chamfer1_edges = [part.edges().sort_by_distance(p)[0] for p in [
        (-3, 4.18, 43.5),
    ]]
    chamfer(chamfer1_edges, length=CHAMFER1_SIZE)


solid = part.part
